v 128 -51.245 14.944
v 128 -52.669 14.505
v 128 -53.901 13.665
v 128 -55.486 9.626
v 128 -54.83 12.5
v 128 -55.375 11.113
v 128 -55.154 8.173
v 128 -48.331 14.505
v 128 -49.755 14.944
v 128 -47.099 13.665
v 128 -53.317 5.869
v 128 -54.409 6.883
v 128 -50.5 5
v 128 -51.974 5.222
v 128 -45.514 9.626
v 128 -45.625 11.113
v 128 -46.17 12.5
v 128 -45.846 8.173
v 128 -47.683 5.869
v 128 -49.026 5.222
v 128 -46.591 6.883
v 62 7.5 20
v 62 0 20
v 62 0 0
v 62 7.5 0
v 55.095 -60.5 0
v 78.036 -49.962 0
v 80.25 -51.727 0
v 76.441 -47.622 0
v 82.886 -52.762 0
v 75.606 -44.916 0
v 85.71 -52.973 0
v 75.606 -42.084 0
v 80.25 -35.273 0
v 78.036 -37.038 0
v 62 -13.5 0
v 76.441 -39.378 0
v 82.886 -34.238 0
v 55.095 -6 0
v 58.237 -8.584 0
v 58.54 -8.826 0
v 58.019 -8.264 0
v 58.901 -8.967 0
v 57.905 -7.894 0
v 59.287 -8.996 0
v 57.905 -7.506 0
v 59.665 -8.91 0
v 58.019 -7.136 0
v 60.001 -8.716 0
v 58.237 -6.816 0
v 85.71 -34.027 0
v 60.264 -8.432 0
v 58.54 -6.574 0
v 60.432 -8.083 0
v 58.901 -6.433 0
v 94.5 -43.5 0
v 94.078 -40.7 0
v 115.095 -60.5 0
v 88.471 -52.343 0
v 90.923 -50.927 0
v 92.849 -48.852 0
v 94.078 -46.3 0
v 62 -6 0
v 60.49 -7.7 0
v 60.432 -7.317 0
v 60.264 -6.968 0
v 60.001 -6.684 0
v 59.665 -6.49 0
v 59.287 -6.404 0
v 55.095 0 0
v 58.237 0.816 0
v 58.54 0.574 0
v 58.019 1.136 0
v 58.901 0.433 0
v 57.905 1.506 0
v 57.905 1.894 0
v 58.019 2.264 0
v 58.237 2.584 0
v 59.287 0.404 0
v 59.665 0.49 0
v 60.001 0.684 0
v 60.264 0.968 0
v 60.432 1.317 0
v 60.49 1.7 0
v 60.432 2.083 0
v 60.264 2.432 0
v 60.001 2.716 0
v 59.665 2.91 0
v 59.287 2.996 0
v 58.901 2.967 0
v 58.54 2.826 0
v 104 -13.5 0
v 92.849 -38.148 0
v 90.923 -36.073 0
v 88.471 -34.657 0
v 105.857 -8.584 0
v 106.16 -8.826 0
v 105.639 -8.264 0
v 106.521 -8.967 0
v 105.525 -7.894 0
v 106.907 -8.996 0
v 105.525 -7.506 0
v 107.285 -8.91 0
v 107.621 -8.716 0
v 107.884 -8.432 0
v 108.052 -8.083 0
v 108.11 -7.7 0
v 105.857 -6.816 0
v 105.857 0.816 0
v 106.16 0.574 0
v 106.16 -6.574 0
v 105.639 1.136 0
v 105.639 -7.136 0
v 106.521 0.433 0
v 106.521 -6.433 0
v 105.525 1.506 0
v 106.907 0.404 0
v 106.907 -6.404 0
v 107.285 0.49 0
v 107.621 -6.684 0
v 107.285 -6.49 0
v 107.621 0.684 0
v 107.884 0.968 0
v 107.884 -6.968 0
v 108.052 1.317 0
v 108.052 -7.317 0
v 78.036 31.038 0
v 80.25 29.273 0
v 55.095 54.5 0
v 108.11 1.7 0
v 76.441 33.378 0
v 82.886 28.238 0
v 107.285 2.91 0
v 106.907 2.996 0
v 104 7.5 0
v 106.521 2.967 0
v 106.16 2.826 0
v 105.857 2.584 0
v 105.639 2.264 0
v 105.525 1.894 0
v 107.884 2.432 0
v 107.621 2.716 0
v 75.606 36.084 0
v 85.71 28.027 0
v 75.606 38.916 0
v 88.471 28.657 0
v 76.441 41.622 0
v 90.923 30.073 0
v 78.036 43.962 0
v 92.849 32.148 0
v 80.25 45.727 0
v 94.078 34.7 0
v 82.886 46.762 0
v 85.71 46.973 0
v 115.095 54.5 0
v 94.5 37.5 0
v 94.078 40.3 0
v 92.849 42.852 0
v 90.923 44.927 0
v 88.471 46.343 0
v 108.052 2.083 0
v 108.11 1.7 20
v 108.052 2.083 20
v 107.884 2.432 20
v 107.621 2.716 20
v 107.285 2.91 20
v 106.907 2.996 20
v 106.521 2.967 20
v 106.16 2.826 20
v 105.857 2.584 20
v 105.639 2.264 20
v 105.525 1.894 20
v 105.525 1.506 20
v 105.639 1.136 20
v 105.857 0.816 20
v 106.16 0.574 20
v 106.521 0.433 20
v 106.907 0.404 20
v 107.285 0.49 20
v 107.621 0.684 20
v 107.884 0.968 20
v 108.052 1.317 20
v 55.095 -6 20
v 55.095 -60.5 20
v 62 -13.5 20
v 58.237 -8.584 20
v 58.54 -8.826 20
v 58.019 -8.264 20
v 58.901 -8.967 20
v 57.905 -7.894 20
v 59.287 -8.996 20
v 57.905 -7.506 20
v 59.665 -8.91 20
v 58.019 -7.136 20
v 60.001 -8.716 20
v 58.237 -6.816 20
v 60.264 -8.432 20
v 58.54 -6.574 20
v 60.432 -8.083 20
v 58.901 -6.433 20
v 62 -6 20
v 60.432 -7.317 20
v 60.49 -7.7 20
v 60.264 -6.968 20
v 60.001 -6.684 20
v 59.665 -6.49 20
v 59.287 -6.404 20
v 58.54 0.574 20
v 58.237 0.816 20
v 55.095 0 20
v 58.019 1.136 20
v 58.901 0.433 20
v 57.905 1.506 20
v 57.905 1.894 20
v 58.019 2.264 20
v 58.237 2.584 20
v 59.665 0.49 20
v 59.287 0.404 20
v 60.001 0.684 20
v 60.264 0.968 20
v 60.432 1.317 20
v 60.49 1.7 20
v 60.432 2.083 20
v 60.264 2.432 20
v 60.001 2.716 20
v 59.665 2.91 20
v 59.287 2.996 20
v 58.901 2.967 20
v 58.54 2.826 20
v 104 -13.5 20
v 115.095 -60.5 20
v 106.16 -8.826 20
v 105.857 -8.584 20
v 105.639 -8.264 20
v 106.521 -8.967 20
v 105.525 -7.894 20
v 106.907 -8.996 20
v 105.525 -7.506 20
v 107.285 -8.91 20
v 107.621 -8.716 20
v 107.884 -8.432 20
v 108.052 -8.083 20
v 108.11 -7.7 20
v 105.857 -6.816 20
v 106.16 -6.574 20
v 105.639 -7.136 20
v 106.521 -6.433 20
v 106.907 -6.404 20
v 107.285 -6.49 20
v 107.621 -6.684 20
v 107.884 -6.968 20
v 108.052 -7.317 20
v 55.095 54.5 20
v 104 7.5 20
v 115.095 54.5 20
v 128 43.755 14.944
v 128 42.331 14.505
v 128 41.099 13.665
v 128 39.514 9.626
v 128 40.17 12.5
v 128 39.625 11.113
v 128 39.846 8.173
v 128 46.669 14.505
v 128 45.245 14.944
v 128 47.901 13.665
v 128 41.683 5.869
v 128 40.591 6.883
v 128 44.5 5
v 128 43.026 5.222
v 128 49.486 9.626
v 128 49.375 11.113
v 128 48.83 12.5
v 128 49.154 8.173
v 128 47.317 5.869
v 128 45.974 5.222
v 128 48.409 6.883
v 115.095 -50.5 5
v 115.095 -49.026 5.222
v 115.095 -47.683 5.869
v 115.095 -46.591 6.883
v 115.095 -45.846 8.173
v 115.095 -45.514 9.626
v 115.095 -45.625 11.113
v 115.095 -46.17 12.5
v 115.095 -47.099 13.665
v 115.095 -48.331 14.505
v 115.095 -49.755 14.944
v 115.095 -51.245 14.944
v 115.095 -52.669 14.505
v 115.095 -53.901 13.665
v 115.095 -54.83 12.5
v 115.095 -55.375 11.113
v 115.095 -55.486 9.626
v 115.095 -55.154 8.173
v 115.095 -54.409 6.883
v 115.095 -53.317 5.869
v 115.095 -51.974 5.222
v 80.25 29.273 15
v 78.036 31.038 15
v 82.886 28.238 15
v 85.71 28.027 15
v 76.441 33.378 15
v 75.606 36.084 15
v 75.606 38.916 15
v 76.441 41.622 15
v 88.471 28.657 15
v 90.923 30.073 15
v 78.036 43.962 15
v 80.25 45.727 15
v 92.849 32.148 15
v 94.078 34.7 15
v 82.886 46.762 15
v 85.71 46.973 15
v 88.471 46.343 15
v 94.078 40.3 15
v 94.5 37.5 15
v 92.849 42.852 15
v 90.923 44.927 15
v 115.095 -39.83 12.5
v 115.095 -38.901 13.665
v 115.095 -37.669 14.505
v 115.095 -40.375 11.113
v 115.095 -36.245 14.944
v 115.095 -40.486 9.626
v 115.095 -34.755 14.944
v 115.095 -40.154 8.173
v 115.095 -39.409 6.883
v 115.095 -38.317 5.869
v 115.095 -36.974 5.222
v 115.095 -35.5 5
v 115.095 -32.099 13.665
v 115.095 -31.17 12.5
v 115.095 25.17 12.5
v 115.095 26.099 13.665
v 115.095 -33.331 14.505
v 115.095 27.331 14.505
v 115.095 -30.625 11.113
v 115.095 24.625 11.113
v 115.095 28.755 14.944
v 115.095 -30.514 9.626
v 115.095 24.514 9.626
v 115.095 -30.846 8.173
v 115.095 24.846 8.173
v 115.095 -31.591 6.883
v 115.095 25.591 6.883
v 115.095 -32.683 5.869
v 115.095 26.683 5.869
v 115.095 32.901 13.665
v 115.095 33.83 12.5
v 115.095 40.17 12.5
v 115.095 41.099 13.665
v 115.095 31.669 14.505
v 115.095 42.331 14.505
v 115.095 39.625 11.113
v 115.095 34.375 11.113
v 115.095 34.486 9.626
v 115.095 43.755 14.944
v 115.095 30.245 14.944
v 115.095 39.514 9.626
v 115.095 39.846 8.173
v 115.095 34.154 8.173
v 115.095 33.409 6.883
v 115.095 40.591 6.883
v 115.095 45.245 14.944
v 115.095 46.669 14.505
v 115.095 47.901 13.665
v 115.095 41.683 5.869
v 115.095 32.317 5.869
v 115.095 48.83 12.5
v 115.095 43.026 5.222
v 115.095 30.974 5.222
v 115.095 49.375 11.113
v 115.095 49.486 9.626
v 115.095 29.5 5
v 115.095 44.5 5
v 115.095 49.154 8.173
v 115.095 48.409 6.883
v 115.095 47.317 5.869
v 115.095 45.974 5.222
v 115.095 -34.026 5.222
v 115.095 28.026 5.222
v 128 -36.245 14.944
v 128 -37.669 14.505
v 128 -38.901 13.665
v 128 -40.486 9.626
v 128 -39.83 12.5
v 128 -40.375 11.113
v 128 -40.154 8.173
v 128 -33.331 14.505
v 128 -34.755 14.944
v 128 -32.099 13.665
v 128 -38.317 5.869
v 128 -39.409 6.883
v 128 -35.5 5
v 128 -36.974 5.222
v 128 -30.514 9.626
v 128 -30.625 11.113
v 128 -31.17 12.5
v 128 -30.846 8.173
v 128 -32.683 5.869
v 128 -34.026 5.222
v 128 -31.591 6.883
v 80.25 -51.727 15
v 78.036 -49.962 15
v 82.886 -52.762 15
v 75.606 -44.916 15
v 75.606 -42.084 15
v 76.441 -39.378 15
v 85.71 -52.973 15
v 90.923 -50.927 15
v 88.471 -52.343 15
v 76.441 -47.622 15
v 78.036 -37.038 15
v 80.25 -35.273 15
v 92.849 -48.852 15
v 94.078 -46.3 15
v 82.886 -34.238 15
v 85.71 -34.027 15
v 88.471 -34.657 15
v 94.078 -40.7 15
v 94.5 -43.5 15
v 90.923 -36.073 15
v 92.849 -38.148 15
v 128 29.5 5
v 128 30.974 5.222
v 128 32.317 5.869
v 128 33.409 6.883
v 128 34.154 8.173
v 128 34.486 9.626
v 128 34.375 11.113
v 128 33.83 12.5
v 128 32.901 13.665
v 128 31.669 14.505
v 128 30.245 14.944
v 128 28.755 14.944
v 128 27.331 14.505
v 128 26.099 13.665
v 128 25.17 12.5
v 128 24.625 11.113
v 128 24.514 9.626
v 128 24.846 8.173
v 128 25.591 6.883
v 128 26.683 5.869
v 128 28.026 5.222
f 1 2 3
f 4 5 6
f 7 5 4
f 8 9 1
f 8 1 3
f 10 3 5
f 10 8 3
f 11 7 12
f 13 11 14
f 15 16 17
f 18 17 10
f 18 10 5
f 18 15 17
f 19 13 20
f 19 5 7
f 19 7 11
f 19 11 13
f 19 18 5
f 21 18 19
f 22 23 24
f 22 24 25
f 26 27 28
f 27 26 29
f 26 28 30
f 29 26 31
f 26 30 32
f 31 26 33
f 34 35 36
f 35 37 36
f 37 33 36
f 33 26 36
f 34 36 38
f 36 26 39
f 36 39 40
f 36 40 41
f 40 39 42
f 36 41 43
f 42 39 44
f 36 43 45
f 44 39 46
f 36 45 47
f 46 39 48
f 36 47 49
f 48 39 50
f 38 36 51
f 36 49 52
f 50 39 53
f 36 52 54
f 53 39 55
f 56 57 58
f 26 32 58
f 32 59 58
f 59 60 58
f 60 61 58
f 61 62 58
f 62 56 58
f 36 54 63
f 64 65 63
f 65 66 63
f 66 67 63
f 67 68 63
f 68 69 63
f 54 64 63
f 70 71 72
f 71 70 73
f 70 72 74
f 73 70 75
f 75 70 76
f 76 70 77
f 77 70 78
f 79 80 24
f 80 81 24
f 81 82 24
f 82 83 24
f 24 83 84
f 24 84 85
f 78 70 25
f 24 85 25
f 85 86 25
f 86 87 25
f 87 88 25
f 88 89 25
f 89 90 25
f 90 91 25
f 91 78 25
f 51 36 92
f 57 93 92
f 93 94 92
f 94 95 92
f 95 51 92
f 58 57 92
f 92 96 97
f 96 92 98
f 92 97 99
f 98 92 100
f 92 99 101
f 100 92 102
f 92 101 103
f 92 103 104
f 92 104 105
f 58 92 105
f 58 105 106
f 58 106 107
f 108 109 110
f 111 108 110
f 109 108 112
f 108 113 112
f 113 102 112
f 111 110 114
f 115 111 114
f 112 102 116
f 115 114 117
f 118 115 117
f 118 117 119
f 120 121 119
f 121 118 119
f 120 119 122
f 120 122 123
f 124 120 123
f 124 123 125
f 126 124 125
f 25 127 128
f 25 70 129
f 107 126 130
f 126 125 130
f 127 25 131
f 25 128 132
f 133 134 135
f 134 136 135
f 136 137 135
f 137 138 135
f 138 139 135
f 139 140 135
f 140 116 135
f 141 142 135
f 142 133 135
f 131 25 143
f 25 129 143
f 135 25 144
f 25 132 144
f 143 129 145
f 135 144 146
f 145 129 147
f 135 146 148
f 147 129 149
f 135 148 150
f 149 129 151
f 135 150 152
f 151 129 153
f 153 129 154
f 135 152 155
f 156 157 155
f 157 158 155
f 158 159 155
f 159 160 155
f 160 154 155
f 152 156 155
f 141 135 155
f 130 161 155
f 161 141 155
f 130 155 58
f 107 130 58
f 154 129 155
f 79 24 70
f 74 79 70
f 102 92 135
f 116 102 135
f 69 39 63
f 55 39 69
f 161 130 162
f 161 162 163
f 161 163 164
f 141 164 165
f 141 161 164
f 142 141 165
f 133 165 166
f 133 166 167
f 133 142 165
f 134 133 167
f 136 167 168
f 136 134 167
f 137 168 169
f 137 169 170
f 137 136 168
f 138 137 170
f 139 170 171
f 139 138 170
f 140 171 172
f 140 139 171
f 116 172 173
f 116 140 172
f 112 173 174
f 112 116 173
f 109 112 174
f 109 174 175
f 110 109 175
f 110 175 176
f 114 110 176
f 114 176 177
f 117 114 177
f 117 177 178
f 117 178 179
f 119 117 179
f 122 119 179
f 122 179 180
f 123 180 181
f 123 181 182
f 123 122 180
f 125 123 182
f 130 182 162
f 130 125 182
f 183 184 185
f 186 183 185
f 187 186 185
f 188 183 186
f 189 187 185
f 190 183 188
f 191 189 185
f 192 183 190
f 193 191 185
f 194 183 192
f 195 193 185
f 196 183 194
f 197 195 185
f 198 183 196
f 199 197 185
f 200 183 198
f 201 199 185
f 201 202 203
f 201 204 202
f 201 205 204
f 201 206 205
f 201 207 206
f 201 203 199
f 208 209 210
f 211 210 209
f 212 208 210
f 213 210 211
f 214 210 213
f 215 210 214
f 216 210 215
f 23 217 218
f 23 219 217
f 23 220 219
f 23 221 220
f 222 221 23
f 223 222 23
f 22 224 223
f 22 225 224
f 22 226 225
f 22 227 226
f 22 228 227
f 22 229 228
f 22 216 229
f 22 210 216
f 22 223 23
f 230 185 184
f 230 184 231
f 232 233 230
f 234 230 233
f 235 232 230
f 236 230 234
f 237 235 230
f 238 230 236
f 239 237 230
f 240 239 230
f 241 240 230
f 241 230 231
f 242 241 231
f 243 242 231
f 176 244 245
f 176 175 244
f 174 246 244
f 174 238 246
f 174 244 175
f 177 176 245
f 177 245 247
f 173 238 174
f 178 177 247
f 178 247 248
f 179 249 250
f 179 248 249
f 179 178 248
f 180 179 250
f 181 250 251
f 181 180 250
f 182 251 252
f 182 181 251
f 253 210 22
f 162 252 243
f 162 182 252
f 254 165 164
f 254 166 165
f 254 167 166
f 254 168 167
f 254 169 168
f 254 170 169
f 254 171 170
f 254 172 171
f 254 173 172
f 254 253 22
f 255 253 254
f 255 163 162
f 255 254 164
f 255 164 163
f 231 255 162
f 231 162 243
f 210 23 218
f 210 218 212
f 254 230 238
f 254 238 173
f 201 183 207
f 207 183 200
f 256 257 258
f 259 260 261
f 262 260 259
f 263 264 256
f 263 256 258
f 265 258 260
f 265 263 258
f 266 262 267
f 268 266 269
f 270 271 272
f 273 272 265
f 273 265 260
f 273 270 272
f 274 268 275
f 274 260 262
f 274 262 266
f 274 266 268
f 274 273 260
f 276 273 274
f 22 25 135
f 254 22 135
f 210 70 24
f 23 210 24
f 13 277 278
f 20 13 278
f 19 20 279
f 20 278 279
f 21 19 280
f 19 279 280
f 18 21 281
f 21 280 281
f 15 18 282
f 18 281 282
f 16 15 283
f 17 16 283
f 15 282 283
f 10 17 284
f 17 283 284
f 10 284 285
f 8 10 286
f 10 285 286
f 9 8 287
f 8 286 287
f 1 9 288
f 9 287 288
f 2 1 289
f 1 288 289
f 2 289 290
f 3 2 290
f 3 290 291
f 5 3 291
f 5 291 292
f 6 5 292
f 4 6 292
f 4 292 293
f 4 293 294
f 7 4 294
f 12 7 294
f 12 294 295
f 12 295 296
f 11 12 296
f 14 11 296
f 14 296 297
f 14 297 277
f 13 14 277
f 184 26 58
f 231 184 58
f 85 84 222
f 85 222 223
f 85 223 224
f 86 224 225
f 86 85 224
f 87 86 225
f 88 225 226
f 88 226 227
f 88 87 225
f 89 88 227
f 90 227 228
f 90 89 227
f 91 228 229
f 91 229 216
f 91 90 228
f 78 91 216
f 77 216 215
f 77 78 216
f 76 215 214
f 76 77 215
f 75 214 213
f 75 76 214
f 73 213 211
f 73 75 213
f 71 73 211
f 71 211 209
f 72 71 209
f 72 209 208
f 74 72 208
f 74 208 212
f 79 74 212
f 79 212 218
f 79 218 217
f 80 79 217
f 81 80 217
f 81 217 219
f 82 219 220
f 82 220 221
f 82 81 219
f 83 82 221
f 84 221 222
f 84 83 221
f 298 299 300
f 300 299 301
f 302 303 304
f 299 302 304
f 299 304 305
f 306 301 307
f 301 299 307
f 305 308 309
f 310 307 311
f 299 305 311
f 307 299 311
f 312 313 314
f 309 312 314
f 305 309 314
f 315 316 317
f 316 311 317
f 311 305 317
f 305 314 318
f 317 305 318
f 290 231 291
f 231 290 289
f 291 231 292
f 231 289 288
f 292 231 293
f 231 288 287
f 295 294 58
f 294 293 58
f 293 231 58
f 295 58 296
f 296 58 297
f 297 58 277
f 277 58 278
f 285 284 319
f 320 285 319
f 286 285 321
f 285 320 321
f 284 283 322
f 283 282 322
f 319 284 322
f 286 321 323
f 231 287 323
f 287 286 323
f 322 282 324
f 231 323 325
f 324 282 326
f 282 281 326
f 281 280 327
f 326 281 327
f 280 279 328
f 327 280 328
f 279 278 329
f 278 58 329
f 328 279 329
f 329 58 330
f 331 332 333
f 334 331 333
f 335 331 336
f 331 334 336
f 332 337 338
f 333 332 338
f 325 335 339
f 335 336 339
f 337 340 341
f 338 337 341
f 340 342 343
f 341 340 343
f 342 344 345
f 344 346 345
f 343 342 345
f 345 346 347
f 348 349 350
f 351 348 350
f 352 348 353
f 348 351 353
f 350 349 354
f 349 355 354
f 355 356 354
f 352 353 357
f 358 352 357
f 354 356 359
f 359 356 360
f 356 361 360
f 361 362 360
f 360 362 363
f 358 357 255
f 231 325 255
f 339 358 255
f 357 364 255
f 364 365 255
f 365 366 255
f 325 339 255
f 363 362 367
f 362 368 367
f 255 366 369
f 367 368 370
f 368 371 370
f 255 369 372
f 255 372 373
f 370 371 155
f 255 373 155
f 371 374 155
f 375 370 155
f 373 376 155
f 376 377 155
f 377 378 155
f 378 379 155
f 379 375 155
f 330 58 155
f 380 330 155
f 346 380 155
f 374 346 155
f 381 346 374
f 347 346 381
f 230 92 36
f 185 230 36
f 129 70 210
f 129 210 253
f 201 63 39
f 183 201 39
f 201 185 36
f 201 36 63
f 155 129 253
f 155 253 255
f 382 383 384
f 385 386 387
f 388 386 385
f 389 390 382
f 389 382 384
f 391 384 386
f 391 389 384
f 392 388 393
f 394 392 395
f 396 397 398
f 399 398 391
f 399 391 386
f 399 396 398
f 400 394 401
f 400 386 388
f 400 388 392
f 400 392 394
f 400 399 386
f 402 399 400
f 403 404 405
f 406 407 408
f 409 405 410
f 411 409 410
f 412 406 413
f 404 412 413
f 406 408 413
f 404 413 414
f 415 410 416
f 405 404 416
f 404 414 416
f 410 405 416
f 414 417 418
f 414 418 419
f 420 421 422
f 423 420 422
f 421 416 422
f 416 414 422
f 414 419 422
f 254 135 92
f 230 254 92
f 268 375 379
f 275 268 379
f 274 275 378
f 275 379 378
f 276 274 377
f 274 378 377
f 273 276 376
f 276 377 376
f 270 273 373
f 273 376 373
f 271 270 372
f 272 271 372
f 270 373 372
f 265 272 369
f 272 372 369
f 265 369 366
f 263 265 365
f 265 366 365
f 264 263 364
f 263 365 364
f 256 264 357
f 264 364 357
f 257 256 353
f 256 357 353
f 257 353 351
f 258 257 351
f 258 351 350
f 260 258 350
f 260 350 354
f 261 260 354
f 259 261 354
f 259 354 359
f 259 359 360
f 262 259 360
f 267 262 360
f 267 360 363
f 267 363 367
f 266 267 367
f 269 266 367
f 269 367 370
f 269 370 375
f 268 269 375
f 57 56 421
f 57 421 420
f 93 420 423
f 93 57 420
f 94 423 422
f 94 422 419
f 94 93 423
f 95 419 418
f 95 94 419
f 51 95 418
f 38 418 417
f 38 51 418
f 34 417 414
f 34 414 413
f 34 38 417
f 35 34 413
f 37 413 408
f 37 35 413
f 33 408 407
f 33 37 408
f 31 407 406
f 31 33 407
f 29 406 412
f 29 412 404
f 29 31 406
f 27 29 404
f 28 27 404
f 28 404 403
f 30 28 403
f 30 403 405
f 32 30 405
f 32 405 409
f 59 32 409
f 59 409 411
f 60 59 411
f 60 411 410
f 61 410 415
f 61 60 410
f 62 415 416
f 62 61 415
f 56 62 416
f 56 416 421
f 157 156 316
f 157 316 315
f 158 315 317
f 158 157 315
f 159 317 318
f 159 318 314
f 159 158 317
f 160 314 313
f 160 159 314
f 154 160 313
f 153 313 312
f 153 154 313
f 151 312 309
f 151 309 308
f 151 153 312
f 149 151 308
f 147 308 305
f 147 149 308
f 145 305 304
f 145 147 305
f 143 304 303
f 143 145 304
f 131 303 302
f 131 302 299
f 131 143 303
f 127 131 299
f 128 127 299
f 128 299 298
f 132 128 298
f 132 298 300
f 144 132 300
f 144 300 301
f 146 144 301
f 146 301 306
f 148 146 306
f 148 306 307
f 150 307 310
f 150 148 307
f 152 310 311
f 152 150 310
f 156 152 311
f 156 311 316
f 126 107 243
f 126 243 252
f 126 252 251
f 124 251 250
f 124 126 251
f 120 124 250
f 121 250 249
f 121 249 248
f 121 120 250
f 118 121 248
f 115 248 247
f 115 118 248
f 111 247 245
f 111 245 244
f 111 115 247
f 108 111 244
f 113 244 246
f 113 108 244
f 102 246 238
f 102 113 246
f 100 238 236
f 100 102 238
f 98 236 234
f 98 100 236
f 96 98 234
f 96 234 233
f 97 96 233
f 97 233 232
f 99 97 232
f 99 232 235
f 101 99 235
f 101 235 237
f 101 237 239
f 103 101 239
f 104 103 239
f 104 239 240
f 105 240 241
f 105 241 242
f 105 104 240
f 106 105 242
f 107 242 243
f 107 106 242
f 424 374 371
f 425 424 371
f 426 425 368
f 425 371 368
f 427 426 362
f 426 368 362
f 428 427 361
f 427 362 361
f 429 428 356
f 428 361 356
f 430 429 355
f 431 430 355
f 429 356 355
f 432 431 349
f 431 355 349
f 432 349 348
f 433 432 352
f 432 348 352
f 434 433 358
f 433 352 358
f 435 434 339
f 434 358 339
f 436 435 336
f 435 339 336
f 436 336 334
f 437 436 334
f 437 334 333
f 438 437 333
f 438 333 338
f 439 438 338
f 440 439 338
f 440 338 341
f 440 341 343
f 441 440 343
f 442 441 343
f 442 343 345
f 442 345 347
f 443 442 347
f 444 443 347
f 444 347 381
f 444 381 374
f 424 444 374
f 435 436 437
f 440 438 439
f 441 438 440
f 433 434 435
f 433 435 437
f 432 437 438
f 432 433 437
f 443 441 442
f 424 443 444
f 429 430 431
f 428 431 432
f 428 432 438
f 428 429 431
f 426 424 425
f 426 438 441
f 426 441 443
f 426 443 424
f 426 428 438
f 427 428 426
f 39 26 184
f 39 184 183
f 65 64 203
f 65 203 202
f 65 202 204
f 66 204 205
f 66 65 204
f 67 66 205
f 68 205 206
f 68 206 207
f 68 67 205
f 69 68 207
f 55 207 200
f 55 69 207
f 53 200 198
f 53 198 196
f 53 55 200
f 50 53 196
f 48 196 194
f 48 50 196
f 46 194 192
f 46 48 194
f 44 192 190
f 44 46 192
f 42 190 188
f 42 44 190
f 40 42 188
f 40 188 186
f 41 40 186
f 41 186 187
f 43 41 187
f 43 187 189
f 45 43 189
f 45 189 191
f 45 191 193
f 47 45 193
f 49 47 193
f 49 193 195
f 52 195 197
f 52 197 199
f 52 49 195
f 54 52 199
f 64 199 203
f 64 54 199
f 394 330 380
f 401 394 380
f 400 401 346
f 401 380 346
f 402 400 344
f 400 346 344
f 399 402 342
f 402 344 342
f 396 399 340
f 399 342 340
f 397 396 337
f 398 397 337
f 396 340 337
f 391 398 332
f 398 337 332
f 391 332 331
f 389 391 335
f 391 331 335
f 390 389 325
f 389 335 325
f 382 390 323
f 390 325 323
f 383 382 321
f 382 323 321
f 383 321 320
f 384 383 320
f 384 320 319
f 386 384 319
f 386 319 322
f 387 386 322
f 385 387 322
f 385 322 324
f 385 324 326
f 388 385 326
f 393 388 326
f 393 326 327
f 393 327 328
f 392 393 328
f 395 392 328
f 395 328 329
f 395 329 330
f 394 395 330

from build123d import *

# Parameters (mm, degrees)
SKETCH_5_W          = 60
SKETCH_5_H          = 115
EXTRUDE_2_DEPTH     = 20
SKETCH_1_R          = 1.3
CUT_EXTRUDE_4_DEPTH = 20
SKETCH_6_R          = 5
EXTRUDE_3_DEPTH     = 13
SKETCH_22_R         = 9.5
CUT_EXTRUDE_5_DEPTH = 15
SKETCH_22_10_R      = 9.5
CUT_EXTRUDE_6_DEPTH = 15


with BuildPart() as part:
    # Sketch 5 → Extrude 2 (new body)
    with BuildSketch(Plane.XY):
        with Locations((85.095319229, -3)):
            Rectangle(SKETCH_5_W, SKETCH_5_H)
    extrude(amount=EXTRUDE_2_DEPTH)

    # Sketch 1 → Cut-Extrude 4 (cut)
    with BuildSketch(Plane.XY):
        with Locations((59.19, 1.7)):
            Circle(SKETCH_1_R)
        with Locations((106.81, 1.7)):
            Circle(SKETCH_1_R)
        with Locations((106.81, -7.7)):
            Circle(SKETCH_1_R)
        with Locations((59.19, -7.7)):
            Circle(SKETCH_1_R)
        Polygon((55, -3), (55, 0), (62, 0), (62, 7.5), (104, 7.5), (104, -13.5), (62, -13.5), (62, -6), (55, -6), align=None)
    extrude(amount=CUT_EXTRUDE_4_DEPTH, mode=Mode.SUBTRACT)

    # Sketch 6 → Extrude 3 (add)
    with BuildSketch(Plane(origin=(115, 0, 0), x_dir=(0, 0, -1), z_dir=(1, 0, 0))):
        with Locations((-10, 44.5)):
            Circle(SKETCH_6_R)
        with Locations((-10, 29.5)):
            Circle(SKETCH_6_R)
        with Locations((-10, -35.5)):
            Circle(SKETCH_6_R)
        with Locations((-10, -50.5)):
            Circle(SKETCH_6_R)
    extrude(amount=EXTRUDE_3_DEPTH)

    # Sketch 22 → Cut-Extrude 5 (cut)
    with BuildSketch(Plane.XY):
        with Locations((85, 37.5)):
            Circle(SKETCH_22_R)
    extrude(amount=CUT_EXTRUDE_5_DEPTH, mode=Mode.SUBTRACT)

    # Sketch 22_10 → Cut-Extrude 6 (cut)
    with BuildSketch(Plane.XY):
        with Locations((85, -43.5)):
            Circle(SKETCH_22_10_R)
    extrude(amount=CUT_EXTRUDE_6_DEPTH, mode=Mode.SUBTRACT)


solid = part.part
